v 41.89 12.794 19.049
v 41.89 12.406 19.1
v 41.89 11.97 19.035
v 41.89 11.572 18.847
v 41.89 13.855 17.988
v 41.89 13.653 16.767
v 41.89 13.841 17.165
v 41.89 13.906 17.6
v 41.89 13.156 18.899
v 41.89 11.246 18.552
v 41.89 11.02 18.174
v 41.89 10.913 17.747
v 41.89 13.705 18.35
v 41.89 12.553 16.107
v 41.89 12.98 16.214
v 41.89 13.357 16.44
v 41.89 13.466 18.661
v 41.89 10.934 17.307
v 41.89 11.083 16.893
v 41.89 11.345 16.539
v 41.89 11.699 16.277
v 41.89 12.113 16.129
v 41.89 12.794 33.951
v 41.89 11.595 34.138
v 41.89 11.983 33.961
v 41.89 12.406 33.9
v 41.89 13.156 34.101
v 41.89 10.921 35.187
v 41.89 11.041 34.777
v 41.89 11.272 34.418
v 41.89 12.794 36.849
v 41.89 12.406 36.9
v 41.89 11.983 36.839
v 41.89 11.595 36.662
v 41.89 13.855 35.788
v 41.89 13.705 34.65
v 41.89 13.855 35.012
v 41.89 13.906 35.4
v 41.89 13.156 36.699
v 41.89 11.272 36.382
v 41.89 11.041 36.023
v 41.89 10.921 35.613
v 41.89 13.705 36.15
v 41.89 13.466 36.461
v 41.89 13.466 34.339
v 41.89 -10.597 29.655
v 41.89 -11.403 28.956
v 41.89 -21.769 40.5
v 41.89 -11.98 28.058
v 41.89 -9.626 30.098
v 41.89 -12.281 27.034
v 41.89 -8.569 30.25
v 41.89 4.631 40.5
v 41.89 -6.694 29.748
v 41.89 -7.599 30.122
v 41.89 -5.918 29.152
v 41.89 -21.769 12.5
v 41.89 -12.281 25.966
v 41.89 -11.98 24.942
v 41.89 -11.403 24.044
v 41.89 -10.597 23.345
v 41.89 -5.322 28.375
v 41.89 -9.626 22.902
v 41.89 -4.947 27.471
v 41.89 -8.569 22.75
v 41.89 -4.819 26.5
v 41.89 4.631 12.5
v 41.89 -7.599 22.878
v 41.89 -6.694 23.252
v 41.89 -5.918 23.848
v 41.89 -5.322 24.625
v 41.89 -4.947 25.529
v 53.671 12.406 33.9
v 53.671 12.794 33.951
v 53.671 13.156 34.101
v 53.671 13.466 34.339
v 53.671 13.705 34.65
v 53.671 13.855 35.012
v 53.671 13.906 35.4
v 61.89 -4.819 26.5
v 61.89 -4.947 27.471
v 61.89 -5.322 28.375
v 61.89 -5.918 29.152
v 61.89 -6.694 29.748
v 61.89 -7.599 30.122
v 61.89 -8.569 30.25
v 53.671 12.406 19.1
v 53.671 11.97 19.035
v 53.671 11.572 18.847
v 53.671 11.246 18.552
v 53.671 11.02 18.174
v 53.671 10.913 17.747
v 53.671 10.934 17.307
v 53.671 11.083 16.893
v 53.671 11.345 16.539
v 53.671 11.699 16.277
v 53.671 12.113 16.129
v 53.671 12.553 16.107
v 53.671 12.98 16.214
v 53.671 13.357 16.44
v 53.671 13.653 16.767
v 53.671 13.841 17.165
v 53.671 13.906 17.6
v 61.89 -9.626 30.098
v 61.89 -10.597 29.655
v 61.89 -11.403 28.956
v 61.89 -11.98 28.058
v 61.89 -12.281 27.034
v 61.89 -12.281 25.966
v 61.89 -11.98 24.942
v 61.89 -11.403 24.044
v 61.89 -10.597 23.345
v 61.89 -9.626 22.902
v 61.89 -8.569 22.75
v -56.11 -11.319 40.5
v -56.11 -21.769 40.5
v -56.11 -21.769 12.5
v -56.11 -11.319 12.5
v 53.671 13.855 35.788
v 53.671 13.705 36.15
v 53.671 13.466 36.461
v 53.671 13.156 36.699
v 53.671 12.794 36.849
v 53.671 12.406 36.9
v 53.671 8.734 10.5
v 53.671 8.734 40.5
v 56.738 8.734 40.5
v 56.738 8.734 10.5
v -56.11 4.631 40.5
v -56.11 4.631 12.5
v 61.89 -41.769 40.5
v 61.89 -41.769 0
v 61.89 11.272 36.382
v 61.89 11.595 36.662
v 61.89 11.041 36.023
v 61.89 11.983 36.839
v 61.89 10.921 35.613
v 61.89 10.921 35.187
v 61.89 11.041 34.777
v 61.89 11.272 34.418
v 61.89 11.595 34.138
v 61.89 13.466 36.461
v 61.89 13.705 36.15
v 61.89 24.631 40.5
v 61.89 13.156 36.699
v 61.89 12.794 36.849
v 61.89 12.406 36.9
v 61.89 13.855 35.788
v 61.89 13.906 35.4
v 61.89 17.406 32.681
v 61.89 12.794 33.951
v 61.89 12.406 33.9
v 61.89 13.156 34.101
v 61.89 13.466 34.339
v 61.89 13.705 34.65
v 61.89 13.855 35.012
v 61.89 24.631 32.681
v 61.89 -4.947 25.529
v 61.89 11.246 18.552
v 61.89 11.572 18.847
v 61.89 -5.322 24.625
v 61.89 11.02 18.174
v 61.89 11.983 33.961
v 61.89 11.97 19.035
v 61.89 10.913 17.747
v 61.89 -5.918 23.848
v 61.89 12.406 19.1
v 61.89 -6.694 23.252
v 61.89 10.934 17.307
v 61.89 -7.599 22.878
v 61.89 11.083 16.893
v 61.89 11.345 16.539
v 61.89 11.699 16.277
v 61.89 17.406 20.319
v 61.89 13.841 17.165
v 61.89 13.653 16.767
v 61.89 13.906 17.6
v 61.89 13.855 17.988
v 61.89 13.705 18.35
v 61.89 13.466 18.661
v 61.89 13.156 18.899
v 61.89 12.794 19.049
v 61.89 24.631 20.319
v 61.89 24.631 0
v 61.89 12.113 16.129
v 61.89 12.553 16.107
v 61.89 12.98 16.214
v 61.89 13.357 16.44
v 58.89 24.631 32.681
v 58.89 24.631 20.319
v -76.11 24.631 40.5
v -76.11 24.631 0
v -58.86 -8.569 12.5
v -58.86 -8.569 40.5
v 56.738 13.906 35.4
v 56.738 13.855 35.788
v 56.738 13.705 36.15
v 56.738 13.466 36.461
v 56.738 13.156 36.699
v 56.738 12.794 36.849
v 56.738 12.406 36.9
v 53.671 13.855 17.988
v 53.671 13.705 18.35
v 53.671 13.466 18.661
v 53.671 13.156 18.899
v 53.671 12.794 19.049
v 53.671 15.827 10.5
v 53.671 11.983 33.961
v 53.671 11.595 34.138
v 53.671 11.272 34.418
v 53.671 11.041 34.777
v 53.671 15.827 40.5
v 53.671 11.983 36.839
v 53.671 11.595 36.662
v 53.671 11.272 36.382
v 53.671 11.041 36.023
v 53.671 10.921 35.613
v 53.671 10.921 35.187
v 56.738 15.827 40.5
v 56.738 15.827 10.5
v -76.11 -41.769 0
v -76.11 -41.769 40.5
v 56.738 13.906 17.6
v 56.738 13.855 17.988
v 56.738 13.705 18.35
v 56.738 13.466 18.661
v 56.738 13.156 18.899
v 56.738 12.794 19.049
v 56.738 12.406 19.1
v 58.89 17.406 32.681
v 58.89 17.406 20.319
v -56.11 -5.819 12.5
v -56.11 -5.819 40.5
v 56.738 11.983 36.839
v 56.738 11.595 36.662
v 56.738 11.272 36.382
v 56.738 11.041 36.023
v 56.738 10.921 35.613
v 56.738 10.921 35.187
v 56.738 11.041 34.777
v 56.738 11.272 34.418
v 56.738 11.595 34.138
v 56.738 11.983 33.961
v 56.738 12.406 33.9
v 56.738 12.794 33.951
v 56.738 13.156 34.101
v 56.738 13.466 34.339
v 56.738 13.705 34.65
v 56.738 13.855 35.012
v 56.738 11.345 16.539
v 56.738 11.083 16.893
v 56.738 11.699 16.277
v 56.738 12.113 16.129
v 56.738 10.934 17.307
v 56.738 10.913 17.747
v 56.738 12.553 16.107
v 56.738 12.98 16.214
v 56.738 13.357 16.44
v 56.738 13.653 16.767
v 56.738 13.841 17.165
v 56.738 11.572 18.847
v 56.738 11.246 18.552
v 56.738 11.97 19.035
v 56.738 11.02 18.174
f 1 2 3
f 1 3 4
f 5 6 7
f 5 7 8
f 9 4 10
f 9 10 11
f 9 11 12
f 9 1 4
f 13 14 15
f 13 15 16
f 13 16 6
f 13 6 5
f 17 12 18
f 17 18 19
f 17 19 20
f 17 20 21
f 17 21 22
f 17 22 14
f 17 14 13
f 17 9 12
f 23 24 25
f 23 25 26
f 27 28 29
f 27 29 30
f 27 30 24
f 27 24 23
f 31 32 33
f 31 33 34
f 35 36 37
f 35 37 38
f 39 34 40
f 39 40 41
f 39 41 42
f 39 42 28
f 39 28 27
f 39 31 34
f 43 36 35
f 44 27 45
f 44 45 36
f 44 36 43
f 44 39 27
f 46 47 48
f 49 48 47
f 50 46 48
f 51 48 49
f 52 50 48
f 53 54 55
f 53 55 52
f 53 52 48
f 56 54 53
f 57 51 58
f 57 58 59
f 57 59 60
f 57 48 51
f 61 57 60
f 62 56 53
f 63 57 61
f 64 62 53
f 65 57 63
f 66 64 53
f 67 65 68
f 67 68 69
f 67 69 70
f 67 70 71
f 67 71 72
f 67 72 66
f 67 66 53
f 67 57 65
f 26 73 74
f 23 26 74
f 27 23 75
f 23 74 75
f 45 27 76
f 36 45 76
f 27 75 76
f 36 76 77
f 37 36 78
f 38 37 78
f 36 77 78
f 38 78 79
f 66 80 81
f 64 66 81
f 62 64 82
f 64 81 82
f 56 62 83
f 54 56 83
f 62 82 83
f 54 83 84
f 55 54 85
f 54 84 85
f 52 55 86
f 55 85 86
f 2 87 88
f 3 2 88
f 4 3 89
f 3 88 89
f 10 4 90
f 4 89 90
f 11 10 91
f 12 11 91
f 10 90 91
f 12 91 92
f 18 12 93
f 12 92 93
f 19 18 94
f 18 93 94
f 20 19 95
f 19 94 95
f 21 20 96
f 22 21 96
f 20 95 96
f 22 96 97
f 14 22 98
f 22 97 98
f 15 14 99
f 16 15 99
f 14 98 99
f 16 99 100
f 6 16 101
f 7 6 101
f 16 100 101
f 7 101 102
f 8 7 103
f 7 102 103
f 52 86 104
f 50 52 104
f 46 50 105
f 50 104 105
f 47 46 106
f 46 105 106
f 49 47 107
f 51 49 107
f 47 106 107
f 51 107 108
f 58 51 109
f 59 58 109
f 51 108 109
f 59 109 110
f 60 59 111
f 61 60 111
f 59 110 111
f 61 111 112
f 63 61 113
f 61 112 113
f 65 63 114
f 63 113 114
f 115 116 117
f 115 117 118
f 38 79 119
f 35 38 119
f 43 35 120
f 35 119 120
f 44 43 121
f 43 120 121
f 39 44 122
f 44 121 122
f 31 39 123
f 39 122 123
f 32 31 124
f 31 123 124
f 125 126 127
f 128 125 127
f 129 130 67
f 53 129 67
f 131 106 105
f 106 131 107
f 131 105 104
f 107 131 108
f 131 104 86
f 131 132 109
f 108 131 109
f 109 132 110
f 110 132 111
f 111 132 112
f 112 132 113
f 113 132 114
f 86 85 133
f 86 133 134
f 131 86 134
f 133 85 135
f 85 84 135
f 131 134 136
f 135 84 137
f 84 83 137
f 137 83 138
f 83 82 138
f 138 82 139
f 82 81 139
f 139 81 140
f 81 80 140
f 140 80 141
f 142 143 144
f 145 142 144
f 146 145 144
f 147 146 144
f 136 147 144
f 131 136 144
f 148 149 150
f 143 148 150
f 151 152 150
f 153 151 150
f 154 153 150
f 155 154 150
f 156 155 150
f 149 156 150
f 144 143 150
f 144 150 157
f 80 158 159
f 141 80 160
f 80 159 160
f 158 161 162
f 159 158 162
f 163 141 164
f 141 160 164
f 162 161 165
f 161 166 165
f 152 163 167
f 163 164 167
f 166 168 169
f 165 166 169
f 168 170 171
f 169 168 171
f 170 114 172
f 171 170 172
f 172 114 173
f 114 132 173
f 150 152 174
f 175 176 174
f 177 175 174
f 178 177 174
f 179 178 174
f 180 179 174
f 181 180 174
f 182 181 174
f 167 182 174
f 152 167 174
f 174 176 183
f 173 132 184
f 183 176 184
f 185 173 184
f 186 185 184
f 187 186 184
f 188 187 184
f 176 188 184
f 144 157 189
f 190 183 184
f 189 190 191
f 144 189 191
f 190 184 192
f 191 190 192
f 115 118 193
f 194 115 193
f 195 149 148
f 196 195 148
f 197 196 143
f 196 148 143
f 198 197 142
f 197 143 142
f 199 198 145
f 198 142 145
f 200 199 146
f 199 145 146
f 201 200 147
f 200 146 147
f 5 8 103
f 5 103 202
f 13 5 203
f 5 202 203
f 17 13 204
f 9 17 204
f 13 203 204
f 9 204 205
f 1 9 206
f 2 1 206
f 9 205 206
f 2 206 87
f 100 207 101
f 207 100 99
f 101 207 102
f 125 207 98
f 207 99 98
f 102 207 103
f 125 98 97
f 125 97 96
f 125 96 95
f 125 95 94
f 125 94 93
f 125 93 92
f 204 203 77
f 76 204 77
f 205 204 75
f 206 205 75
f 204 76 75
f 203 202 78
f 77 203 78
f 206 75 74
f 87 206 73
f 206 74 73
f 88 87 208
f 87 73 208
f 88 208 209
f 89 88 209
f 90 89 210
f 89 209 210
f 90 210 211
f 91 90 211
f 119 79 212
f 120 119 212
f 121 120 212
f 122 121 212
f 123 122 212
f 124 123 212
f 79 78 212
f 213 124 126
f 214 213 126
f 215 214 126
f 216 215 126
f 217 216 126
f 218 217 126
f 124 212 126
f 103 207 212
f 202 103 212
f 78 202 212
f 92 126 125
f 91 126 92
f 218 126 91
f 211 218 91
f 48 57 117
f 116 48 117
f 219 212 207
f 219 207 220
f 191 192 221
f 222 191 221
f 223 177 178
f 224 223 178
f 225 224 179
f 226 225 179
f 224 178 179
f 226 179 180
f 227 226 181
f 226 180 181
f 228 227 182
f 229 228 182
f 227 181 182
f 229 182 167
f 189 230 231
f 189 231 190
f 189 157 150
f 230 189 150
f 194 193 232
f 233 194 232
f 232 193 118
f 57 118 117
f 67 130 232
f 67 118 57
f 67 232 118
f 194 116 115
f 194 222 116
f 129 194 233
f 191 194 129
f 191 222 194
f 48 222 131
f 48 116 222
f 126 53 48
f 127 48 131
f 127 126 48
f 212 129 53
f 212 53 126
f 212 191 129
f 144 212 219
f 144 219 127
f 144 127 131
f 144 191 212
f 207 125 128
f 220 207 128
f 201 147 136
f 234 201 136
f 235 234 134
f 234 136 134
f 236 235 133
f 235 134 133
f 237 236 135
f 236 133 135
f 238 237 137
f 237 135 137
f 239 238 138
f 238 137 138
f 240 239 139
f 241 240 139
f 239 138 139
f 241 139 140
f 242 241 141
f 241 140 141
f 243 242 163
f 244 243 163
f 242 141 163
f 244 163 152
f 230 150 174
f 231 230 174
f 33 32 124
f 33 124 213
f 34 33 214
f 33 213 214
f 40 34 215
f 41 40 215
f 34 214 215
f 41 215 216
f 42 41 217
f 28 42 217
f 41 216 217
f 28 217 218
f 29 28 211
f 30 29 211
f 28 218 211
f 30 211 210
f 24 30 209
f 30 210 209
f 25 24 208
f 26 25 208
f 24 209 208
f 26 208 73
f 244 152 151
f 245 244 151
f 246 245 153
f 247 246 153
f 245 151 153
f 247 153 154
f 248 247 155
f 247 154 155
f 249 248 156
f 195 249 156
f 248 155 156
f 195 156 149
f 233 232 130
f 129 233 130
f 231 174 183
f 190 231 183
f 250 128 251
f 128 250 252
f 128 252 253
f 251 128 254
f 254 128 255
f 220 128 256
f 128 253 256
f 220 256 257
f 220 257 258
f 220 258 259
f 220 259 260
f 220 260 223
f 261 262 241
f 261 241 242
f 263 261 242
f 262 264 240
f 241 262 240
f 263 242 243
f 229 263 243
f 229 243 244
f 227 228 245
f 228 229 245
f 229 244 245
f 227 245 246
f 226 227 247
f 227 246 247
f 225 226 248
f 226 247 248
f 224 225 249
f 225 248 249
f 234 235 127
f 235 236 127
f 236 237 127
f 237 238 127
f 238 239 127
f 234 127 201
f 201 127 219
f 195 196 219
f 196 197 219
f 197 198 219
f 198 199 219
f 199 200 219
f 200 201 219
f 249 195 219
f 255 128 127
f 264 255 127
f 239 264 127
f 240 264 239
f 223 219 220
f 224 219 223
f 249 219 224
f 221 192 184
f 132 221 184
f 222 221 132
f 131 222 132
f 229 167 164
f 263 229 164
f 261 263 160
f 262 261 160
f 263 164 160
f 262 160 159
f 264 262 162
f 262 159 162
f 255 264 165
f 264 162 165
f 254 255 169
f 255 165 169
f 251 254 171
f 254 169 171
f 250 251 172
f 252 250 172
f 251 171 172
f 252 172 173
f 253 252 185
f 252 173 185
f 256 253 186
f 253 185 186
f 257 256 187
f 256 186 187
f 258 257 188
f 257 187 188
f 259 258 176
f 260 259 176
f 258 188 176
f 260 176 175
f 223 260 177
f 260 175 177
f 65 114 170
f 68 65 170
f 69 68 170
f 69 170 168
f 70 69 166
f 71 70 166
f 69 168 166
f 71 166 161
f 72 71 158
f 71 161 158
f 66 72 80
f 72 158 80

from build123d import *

# Parameters (mm, degrees)
F0_W      = 138
F0_H      = 66.4
F1_DEPTH  = 12.5
F2_W      = 20
F2_H      = 26.4
F3_DEPTH  = 28
F5_DEPTH  = 25
F7_DEPTH  = 3
F9_DEPTH  = 20
F10_DEPTH = 15
F8_W      = 3.067044
F8_H      = 3.546548
F11_DEPTH = 30


with BuildPart() as f1:
    # F0 (on Top) → F1 (new body)
    with BuildSketch(Plane.XY):
        with Locations((-7.109798, -8.569356)):
            Rectangle(F0_W, F0_H)
    extrude(amount=F1_DEPTH)

    # F2 (on face) → F3 (join)
    with BuildSketch(Plane.XY.offset(12.5)):
        Polygon((-76.109798, -21.769356), (-76.109798, -41.769356), (61.890202, -41.769356), (61.890202, -21.769356), (41.890202, -21.769356), (-56.109798, -21.769356), (-58.859691, -21.769356), align=None)
        Polygon((-76.109798, 4.630644), (-76.109798, -21.769356), (-58.859691, -21.769356), (-58.859691, -8.569356), (-58.859691, 4.630644), align=None)
        with Locations((51.890202, -8.569356)):
            Rectangle(F2_W, F2_H)
        Polygon((-76.109798, 24.630644), (-76.109798, 4.630644), (-58.859691, 4.630644), (-56.109798, 4.630644), (41.890202, 4.630644), (61.890202, 4.630644), (61.890202, 24.630644), align=None)
        Polygon((-58.859691, 4.630644), (-58.859691, -8.569356), (-56.109798, -5.819463), (-56.109798, 4.630644), align=None)
        Polygon((-58.859691, -8.569356), (-58.859691, -21.769356), (-56.109798, -21.769356), (-56.109798, -11.319249), align=None)
    extrude(amount=F3_DEPTH)

    # F4 (on face) → F5 (cut)
    with BuildSketch(Plane.YZ.offset(61.890202)):
        with BuildLine():
            ThreePointArc((-8.569356, 22.75), (-5.917706, 23.84835), (-4.819356, 26.5))
            ThreePointArc((-4.819356, 26.5), (-5.917706, 29.15165), (-8.569356, 30.25))
            Line((-8.569356, 30.25), (-8.569356, 22.75))
        make_face()
        with BuildLine():
            Line((-8.569356, 22.75), (-8.569356, 30.25))
            ThreePointArc((-8.569356, 30.25), (-12.319356, 26.5), (-8.569356, 22.75))
        make_face()
    extrude(amount=-F5_DEPTH, mode=Mode.SUBTRACT)

    # F6 (on face) → F7 (cut)
    with BuildSketch(Plane.YZ.offset(61.890202)):
        Polygon((17.405644, 32.680817), (17.405644, 26.5), (17.405644, 20.319183), (24.630644, 20.319183), (24.630644, 32.680817), align=None)
    extrude(amount=-F7_DEPTH, mode=Mode.SUBTRACT)

    # F6 (on face) → F9 (cut)
    with BuildSketch(Plane.YZ.offset(61.890202)):
        with BuildLine():
            ThreePointArc((13.905644, 17.6), (13.466304, 18.66066), (12.405644, 19.1))
            ThreePointArc((12.405644, 19.1), (11.344984, 16.53934), (13.905644, 17.6))
        make_face()
        with BuildLine():
            Line((12.405644, 35.4), (12.405644, 36.9))
            ThreePointArc((12.405644, 36.9), (10.905644, 35.4), (12.405644, 33.9))
            Line((12.405644, 33.9), (12.405644, 35.4))
        make_face()
        with BuildLine():
            ThreePointArc((12.405644, 33.9), (13.466304, 34.33934), (13.905644, 35.4))
            ThreePointArc((13.905644, 35.4), (13.466304, 36.46066), (12.405644, 36.9))
            Line((12.405644, 36.9), (12.405644, 35.4))
            Line((12.405644, 35.4), (12.405644, 33.9))
        make_face()
    extrude(amount=-F9_DEPTH, mode=Mode.SUBTRACT)

    # F6 (on face) → F10 (cut)
    with BuildSketch(Plane.YZ.offset(61.890202)):
        with BuildLine():
            ThreePointArc((12.405644, 33.9), (13.466304, 34.33934), (13.905644, 35.4))
            ThreePointArc((13.905644, 35.4), (13.466304, 36.46066), (12.405644, 36.9))
            Line((12.405644, 36.9), (12.405644, 35.4))
            Line((12.405644, 35.4), (12.405644, 33.9))
        make_face()
        with BuildLine():
            Line((12.405644, 35.4), (12.405644, 36.9))
            ThreePointArc((12.405644, 36.9), (10.905644, 35.4), (12.405644, 33.9))
            Line((12.405644, 33.9), (12.405644, 35.4))
        make_face()
        with BuildLine():
            ThreePointArc((13.905644, 17.6), (13.466304, 18.66066), (12.405644, 19.1))
            ThreePointArc((12.405644, 19.1), (11.344984, 16.53934), (13.905644, 17.6))
        make_face()
    extrude(amount=-F10_DEPTH, mode=Mode.SUBTRACT)

    # F8 (on face) → F11 (cut)
    with BuildSketch(Plane.XY.offset(40.5)):
        with Locations((55.204206, 10.50737)):
            Rectangle(F8_W, F8_H)
        with Locations((55.204206, 14.053918)):
            Rectangle(F8_W, F8_H)
    extrude(amount=-F11_DEPTH, mode=Mode.SUBTRACT)


solid = f1.part
